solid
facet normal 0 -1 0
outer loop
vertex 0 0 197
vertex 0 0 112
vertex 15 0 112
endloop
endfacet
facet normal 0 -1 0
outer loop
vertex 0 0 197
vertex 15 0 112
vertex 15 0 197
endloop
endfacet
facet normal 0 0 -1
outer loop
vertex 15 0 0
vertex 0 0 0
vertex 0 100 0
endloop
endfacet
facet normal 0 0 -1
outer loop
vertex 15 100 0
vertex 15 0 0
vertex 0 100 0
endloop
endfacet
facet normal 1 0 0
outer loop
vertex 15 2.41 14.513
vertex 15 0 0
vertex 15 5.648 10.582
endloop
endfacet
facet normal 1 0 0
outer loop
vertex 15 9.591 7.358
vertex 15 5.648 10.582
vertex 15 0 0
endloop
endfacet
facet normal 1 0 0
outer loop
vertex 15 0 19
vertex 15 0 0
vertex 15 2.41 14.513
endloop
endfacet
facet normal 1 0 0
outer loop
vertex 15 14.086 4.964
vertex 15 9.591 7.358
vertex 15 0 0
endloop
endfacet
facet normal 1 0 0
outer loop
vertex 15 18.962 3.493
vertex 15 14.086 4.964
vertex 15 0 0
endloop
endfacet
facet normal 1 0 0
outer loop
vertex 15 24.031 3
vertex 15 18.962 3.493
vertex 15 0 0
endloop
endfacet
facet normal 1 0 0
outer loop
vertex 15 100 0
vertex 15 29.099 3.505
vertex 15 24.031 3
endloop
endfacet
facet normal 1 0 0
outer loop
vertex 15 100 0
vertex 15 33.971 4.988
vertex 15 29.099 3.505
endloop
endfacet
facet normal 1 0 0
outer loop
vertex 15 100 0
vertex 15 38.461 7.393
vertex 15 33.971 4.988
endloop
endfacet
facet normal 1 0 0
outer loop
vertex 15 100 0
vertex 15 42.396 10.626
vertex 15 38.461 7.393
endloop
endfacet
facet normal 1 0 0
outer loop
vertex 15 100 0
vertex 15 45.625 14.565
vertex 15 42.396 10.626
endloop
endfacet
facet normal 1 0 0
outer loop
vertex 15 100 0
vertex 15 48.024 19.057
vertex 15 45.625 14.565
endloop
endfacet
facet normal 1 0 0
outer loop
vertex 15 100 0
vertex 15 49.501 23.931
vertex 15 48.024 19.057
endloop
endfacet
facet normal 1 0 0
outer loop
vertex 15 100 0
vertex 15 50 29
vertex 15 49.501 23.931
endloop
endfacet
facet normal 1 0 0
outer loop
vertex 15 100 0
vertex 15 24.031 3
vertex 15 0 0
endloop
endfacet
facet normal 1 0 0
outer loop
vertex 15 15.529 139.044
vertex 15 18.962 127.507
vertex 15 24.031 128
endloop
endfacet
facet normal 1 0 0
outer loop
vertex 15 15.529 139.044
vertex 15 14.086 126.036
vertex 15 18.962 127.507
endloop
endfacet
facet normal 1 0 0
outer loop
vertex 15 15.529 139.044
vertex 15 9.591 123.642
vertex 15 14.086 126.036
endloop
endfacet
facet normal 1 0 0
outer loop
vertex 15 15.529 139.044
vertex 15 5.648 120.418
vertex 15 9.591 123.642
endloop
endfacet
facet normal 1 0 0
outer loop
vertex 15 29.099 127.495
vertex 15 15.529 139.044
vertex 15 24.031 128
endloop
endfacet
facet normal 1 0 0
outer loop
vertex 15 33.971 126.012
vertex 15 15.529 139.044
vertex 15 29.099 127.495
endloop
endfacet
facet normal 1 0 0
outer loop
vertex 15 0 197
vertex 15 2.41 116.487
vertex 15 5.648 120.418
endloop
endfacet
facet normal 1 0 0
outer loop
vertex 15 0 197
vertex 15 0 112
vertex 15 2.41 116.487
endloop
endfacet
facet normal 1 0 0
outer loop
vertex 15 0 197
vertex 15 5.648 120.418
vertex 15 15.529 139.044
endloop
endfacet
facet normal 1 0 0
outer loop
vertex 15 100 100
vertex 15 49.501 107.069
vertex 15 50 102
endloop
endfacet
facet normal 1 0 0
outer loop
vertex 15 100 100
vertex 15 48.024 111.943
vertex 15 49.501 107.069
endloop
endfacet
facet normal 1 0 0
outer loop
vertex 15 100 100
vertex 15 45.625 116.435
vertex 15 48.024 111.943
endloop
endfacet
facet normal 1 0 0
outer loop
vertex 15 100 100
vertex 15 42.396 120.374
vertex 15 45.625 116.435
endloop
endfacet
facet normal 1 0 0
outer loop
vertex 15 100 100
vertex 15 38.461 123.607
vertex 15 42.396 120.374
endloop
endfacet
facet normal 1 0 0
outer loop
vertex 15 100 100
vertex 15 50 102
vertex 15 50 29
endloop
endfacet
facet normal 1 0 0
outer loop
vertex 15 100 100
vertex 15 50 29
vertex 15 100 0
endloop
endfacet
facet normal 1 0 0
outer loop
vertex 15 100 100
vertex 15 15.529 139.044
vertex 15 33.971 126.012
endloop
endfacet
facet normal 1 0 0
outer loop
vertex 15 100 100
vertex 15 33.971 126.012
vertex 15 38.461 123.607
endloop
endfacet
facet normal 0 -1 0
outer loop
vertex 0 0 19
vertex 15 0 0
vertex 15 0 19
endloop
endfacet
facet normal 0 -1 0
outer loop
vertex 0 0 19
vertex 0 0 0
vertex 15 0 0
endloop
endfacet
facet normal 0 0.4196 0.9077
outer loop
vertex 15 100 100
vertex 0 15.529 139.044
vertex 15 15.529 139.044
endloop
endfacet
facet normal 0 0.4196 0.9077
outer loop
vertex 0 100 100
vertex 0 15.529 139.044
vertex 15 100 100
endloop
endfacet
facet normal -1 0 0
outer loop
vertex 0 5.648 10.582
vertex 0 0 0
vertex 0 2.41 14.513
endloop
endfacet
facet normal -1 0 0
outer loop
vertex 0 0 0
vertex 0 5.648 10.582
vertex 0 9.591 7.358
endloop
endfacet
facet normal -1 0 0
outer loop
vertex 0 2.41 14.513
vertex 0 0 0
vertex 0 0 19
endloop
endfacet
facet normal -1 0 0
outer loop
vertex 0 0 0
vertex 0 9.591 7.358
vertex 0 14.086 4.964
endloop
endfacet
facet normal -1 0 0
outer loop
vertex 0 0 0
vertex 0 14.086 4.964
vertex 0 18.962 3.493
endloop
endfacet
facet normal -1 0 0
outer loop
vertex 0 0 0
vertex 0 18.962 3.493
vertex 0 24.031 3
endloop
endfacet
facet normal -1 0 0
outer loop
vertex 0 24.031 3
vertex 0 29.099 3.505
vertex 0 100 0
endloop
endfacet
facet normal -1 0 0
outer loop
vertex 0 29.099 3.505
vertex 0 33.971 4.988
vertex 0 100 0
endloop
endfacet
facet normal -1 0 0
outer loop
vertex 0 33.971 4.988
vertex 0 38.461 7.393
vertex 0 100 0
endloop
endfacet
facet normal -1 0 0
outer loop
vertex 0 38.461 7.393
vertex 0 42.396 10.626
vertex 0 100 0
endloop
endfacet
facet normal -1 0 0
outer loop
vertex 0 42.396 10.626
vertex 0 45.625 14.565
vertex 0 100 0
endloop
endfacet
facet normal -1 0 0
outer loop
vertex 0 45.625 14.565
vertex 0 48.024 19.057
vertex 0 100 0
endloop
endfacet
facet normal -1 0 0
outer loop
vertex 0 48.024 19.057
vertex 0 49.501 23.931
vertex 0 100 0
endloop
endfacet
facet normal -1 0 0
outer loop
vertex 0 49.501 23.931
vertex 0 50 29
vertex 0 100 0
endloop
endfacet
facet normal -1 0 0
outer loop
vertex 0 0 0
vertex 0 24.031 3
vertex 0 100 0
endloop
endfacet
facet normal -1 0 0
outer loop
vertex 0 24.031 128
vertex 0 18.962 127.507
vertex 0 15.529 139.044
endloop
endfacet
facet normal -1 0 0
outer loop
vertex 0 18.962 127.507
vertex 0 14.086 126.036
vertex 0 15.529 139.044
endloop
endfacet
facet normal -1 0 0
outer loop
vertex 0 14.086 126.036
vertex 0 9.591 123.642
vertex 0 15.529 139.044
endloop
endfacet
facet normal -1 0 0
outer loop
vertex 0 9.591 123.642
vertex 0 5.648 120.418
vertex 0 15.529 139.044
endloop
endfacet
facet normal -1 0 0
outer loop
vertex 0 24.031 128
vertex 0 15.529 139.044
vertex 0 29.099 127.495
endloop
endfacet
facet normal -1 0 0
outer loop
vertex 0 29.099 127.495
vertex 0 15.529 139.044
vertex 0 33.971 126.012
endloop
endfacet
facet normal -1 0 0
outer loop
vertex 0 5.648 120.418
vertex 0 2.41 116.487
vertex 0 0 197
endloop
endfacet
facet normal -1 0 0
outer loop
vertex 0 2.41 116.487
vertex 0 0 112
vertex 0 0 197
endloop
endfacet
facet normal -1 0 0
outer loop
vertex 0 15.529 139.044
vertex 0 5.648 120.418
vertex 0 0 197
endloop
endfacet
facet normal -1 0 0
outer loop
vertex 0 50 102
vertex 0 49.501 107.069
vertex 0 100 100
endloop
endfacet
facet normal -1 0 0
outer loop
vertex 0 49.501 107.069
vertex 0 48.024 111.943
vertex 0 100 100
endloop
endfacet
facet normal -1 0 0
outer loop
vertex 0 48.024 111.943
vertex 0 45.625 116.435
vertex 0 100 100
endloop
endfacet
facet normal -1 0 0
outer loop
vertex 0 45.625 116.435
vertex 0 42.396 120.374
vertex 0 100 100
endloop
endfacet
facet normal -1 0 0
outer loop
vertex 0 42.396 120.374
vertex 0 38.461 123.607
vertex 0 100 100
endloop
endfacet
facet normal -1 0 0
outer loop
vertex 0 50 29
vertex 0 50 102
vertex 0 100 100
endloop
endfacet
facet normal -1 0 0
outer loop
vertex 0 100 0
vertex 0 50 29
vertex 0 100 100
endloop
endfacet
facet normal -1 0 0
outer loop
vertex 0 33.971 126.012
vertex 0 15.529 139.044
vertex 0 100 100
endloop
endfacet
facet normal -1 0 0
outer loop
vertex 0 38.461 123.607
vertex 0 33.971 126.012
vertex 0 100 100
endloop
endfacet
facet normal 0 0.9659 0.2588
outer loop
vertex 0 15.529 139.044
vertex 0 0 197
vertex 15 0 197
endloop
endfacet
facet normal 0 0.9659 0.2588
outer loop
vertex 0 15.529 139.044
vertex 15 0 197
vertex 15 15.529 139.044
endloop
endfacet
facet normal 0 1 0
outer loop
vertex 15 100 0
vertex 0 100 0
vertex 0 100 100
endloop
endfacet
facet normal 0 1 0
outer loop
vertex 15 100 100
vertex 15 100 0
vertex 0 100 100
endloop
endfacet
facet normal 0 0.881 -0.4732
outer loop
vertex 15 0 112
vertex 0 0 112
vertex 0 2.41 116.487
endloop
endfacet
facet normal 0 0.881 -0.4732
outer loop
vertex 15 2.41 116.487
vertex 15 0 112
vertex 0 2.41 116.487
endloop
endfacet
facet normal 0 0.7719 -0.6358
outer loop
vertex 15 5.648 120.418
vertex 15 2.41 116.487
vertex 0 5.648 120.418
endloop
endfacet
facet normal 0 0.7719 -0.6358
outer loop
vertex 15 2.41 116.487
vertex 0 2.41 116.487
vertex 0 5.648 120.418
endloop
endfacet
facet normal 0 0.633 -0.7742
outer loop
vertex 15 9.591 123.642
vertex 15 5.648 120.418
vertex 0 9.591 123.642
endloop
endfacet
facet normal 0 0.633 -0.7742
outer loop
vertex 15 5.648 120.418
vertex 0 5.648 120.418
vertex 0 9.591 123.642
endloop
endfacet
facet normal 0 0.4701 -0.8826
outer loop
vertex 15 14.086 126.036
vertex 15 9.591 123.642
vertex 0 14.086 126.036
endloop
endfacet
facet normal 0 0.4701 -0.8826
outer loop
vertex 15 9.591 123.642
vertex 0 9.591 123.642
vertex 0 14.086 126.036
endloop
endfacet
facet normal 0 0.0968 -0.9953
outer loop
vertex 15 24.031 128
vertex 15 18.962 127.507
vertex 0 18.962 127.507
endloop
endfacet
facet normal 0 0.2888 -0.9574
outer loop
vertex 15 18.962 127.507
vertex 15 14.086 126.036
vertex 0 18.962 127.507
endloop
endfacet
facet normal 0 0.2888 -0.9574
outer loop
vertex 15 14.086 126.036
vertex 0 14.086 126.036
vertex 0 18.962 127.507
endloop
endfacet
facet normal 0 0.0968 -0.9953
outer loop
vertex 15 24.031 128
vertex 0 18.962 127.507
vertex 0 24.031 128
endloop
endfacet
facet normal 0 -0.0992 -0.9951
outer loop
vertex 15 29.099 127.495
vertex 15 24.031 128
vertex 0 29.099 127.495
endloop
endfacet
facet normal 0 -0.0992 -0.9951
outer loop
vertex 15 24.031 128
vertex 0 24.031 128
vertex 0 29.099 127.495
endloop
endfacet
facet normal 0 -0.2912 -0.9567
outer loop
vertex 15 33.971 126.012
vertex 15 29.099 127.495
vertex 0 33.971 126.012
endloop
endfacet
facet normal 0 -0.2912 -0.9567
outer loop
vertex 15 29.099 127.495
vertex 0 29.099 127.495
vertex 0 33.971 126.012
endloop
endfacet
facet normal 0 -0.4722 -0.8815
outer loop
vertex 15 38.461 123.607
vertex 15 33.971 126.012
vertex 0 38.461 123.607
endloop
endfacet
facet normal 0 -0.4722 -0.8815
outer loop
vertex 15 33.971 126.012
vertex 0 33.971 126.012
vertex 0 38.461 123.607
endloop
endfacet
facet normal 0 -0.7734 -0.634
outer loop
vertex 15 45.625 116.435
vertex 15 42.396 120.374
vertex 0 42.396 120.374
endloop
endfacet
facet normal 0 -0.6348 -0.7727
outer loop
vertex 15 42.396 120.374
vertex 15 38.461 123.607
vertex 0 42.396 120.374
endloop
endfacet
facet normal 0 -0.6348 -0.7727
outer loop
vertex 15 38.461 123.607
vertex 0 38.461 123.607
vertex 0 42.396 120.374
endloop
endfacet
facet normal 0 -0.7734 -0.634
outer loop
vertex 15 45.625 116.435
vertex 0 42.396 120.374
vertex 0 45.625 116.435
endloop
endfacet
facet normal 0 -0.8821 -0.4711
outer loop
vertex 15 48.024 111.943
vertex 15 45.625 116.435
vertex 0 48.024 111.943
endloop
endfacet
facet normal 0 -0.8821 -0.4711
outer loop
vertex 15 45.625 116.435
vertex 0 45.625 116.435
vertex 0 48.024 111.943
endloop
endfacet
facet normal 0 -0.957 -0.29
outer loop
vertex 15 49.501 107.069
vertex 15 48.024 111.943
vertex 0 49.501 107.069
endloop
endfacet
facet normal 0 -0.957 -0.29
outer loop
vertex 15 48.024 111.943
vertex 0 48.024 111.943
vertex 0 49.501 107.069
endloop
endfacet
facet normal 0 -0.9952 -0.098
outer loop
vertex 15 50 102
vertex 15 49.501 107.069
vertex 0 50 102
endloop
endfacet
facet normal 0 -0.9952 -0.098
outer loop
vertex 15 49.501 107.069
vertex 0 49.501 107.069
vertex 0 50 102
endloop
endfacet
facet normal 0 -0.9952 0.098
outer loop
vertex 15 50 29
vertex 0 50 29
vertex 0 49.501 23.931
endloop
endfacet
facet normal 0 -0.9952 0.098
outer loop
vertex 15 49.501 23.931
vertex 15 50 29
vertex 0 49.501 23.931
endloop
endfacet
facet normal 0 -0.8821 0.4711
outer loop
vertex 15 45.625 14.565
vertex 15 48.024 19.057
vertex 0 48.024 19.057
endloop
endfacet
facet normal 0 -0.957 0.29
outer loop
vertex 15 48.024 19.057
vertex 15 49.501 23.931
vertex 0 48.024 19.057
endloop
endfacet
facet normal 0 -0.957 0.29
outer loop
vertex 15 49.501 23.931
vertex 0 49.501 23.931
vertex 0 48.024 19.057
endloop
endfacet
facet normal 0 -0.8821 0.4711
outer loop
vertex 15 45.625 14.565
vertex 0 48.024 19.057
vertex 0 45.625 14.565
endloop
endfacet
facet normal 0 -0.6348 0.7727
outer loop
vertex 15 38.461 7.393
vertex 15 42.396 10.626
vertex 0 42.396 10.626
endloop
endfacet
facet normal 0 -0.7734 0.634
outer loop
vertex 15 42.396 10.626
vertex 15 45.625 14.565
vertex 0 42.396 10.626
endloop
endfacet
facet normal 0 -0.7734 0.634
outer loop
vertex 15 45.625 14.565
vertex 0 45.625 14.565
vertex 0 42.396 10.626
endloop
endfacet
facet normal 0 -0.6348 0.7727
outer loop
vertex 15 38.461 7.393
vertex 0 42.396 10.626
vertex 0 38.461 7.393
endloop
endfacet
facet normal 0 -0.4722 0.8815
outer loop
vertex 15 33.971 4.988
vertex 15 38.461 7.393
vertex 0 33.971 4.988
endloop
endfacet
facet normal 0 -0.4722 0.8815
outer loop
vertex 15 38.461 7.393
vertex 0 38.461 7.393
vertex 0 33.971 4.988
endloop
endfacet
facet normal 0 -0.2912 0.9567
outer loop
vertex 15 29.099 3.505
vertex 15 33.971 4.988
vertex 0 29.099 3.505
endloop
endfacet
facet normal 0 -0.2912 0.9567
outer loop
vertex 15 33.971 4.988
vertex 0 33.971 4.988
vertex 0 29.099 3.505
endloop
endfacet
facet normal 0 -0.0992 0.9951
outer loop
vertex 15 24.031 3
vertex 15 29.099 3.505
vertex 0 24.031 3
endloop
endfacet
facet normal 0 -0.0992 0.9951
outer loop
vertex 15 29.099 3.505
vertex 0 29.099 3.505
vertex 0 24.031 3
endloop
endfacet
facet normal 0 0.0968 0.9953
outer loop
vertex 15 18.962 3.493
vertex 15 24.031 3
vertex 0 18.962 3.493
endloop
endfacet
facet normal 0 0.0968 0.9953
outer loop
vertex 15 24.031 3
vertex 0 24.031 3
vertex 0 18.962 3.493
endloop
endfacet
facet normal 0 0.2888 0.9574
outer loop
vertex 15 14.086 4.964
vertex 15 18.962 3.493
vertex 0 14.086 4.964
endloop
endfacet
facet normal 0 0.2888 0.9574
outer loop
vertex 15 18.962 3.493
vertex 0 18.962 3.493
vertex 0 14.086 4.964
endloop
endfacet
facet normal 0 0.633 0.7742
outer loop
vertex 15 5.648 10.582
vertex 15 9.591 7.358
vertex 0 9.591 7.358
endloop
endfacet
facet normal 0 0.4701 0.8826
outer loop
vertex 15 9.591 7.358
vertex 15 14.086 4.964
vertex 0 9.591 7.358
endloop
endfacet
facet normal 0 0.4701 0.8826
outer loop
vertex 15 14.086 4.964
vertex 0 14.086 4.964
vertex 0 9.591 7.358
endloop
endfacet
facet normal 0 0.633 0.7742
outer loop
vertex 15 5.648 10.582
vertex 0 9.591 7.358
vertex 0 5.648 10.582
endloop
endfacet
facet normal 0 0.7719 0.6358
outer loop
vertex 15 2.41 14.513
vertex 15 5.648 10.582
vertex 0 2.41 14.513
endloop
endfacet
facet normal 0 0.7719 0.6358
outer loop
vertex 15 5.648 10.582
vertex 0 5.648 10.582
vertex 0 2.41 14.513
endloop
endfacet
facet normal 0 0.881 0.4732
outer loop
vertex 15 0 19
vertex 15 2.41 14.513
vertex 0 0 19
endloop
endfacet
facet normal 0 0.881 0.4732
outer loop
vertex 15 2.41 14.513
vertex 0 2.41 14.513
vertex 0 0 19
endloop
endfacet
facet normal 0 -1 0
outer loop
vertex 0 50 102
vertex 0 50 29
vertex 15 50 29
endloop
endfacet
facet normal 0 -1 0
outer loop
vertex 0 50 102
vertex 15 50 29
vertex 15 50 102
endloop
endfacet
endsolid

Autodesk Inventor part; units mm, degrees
ref_plane "YZ Plane" through (0, 0, 0) normal (1, 0, 0) x (0, 1, 0)
ref_plane "XZ Plane" through (0, 0, 0) normal (0, 1, 0) x (-1, 0, 0)
ref_plane "XY Plane" through (0, 0, 0) normal (0, 0, 1) x (1, 0, 0)
sketch "Sketch2" plane through (0, 0, 0) normal (1, 0, 0) x (0, 1, 0)
  line L0 (0, 0) -> (100, 0)
  line L1 (100, 0) -> (100, 100)
  line L2 (0, 0) -> (0, 197) construction
  line L3 (0, 197) -> (15.5291, 139.0445)
  line L4 (0, 197) -> (60, 197) construction
  line L5 (15.5291, 139.0445) -> (100, 100)
  line L6 (0, 0) -> (24, 0) construction
  line L7 (24, 0) -> (24, 29) construction
  line L8 (24, 29) -> (0, 29) construction
  line L9 (0, 29) -> (0, 0) construction
  line L10 (24, 29) -> (24, 102) construction
  arc A0 (0, 19) -> (50, 29) centre (24, 29) ccw
  line L11 (0, 0) -> (0, 19)
  arc A1 (50, 102) -> (0, 112) centre (24, 102) ccw
  line L12 (24, 102) -> (50, 102) construction
  line L13 (24, 29) -> (50, 29) construction
  line L14 (50, 29) -> (50, 102)
  line L15 (0, 112) -> (0, 197)
  dimension "d10" = 100
  dimension "d11" = 100
  dimension "d12" = 197
  dimension "d13" = 60
  dimension "d14" = 75
  dimension "d15" = 24
  dimension "d16" = 29
  dimension "d17" = 73
  dimension "d18" = 26
  dimension "d19" = 26
extrude "Extrusion1" add sketch "Sketch2" along normal blind 15
properties part number "Side Plate"
